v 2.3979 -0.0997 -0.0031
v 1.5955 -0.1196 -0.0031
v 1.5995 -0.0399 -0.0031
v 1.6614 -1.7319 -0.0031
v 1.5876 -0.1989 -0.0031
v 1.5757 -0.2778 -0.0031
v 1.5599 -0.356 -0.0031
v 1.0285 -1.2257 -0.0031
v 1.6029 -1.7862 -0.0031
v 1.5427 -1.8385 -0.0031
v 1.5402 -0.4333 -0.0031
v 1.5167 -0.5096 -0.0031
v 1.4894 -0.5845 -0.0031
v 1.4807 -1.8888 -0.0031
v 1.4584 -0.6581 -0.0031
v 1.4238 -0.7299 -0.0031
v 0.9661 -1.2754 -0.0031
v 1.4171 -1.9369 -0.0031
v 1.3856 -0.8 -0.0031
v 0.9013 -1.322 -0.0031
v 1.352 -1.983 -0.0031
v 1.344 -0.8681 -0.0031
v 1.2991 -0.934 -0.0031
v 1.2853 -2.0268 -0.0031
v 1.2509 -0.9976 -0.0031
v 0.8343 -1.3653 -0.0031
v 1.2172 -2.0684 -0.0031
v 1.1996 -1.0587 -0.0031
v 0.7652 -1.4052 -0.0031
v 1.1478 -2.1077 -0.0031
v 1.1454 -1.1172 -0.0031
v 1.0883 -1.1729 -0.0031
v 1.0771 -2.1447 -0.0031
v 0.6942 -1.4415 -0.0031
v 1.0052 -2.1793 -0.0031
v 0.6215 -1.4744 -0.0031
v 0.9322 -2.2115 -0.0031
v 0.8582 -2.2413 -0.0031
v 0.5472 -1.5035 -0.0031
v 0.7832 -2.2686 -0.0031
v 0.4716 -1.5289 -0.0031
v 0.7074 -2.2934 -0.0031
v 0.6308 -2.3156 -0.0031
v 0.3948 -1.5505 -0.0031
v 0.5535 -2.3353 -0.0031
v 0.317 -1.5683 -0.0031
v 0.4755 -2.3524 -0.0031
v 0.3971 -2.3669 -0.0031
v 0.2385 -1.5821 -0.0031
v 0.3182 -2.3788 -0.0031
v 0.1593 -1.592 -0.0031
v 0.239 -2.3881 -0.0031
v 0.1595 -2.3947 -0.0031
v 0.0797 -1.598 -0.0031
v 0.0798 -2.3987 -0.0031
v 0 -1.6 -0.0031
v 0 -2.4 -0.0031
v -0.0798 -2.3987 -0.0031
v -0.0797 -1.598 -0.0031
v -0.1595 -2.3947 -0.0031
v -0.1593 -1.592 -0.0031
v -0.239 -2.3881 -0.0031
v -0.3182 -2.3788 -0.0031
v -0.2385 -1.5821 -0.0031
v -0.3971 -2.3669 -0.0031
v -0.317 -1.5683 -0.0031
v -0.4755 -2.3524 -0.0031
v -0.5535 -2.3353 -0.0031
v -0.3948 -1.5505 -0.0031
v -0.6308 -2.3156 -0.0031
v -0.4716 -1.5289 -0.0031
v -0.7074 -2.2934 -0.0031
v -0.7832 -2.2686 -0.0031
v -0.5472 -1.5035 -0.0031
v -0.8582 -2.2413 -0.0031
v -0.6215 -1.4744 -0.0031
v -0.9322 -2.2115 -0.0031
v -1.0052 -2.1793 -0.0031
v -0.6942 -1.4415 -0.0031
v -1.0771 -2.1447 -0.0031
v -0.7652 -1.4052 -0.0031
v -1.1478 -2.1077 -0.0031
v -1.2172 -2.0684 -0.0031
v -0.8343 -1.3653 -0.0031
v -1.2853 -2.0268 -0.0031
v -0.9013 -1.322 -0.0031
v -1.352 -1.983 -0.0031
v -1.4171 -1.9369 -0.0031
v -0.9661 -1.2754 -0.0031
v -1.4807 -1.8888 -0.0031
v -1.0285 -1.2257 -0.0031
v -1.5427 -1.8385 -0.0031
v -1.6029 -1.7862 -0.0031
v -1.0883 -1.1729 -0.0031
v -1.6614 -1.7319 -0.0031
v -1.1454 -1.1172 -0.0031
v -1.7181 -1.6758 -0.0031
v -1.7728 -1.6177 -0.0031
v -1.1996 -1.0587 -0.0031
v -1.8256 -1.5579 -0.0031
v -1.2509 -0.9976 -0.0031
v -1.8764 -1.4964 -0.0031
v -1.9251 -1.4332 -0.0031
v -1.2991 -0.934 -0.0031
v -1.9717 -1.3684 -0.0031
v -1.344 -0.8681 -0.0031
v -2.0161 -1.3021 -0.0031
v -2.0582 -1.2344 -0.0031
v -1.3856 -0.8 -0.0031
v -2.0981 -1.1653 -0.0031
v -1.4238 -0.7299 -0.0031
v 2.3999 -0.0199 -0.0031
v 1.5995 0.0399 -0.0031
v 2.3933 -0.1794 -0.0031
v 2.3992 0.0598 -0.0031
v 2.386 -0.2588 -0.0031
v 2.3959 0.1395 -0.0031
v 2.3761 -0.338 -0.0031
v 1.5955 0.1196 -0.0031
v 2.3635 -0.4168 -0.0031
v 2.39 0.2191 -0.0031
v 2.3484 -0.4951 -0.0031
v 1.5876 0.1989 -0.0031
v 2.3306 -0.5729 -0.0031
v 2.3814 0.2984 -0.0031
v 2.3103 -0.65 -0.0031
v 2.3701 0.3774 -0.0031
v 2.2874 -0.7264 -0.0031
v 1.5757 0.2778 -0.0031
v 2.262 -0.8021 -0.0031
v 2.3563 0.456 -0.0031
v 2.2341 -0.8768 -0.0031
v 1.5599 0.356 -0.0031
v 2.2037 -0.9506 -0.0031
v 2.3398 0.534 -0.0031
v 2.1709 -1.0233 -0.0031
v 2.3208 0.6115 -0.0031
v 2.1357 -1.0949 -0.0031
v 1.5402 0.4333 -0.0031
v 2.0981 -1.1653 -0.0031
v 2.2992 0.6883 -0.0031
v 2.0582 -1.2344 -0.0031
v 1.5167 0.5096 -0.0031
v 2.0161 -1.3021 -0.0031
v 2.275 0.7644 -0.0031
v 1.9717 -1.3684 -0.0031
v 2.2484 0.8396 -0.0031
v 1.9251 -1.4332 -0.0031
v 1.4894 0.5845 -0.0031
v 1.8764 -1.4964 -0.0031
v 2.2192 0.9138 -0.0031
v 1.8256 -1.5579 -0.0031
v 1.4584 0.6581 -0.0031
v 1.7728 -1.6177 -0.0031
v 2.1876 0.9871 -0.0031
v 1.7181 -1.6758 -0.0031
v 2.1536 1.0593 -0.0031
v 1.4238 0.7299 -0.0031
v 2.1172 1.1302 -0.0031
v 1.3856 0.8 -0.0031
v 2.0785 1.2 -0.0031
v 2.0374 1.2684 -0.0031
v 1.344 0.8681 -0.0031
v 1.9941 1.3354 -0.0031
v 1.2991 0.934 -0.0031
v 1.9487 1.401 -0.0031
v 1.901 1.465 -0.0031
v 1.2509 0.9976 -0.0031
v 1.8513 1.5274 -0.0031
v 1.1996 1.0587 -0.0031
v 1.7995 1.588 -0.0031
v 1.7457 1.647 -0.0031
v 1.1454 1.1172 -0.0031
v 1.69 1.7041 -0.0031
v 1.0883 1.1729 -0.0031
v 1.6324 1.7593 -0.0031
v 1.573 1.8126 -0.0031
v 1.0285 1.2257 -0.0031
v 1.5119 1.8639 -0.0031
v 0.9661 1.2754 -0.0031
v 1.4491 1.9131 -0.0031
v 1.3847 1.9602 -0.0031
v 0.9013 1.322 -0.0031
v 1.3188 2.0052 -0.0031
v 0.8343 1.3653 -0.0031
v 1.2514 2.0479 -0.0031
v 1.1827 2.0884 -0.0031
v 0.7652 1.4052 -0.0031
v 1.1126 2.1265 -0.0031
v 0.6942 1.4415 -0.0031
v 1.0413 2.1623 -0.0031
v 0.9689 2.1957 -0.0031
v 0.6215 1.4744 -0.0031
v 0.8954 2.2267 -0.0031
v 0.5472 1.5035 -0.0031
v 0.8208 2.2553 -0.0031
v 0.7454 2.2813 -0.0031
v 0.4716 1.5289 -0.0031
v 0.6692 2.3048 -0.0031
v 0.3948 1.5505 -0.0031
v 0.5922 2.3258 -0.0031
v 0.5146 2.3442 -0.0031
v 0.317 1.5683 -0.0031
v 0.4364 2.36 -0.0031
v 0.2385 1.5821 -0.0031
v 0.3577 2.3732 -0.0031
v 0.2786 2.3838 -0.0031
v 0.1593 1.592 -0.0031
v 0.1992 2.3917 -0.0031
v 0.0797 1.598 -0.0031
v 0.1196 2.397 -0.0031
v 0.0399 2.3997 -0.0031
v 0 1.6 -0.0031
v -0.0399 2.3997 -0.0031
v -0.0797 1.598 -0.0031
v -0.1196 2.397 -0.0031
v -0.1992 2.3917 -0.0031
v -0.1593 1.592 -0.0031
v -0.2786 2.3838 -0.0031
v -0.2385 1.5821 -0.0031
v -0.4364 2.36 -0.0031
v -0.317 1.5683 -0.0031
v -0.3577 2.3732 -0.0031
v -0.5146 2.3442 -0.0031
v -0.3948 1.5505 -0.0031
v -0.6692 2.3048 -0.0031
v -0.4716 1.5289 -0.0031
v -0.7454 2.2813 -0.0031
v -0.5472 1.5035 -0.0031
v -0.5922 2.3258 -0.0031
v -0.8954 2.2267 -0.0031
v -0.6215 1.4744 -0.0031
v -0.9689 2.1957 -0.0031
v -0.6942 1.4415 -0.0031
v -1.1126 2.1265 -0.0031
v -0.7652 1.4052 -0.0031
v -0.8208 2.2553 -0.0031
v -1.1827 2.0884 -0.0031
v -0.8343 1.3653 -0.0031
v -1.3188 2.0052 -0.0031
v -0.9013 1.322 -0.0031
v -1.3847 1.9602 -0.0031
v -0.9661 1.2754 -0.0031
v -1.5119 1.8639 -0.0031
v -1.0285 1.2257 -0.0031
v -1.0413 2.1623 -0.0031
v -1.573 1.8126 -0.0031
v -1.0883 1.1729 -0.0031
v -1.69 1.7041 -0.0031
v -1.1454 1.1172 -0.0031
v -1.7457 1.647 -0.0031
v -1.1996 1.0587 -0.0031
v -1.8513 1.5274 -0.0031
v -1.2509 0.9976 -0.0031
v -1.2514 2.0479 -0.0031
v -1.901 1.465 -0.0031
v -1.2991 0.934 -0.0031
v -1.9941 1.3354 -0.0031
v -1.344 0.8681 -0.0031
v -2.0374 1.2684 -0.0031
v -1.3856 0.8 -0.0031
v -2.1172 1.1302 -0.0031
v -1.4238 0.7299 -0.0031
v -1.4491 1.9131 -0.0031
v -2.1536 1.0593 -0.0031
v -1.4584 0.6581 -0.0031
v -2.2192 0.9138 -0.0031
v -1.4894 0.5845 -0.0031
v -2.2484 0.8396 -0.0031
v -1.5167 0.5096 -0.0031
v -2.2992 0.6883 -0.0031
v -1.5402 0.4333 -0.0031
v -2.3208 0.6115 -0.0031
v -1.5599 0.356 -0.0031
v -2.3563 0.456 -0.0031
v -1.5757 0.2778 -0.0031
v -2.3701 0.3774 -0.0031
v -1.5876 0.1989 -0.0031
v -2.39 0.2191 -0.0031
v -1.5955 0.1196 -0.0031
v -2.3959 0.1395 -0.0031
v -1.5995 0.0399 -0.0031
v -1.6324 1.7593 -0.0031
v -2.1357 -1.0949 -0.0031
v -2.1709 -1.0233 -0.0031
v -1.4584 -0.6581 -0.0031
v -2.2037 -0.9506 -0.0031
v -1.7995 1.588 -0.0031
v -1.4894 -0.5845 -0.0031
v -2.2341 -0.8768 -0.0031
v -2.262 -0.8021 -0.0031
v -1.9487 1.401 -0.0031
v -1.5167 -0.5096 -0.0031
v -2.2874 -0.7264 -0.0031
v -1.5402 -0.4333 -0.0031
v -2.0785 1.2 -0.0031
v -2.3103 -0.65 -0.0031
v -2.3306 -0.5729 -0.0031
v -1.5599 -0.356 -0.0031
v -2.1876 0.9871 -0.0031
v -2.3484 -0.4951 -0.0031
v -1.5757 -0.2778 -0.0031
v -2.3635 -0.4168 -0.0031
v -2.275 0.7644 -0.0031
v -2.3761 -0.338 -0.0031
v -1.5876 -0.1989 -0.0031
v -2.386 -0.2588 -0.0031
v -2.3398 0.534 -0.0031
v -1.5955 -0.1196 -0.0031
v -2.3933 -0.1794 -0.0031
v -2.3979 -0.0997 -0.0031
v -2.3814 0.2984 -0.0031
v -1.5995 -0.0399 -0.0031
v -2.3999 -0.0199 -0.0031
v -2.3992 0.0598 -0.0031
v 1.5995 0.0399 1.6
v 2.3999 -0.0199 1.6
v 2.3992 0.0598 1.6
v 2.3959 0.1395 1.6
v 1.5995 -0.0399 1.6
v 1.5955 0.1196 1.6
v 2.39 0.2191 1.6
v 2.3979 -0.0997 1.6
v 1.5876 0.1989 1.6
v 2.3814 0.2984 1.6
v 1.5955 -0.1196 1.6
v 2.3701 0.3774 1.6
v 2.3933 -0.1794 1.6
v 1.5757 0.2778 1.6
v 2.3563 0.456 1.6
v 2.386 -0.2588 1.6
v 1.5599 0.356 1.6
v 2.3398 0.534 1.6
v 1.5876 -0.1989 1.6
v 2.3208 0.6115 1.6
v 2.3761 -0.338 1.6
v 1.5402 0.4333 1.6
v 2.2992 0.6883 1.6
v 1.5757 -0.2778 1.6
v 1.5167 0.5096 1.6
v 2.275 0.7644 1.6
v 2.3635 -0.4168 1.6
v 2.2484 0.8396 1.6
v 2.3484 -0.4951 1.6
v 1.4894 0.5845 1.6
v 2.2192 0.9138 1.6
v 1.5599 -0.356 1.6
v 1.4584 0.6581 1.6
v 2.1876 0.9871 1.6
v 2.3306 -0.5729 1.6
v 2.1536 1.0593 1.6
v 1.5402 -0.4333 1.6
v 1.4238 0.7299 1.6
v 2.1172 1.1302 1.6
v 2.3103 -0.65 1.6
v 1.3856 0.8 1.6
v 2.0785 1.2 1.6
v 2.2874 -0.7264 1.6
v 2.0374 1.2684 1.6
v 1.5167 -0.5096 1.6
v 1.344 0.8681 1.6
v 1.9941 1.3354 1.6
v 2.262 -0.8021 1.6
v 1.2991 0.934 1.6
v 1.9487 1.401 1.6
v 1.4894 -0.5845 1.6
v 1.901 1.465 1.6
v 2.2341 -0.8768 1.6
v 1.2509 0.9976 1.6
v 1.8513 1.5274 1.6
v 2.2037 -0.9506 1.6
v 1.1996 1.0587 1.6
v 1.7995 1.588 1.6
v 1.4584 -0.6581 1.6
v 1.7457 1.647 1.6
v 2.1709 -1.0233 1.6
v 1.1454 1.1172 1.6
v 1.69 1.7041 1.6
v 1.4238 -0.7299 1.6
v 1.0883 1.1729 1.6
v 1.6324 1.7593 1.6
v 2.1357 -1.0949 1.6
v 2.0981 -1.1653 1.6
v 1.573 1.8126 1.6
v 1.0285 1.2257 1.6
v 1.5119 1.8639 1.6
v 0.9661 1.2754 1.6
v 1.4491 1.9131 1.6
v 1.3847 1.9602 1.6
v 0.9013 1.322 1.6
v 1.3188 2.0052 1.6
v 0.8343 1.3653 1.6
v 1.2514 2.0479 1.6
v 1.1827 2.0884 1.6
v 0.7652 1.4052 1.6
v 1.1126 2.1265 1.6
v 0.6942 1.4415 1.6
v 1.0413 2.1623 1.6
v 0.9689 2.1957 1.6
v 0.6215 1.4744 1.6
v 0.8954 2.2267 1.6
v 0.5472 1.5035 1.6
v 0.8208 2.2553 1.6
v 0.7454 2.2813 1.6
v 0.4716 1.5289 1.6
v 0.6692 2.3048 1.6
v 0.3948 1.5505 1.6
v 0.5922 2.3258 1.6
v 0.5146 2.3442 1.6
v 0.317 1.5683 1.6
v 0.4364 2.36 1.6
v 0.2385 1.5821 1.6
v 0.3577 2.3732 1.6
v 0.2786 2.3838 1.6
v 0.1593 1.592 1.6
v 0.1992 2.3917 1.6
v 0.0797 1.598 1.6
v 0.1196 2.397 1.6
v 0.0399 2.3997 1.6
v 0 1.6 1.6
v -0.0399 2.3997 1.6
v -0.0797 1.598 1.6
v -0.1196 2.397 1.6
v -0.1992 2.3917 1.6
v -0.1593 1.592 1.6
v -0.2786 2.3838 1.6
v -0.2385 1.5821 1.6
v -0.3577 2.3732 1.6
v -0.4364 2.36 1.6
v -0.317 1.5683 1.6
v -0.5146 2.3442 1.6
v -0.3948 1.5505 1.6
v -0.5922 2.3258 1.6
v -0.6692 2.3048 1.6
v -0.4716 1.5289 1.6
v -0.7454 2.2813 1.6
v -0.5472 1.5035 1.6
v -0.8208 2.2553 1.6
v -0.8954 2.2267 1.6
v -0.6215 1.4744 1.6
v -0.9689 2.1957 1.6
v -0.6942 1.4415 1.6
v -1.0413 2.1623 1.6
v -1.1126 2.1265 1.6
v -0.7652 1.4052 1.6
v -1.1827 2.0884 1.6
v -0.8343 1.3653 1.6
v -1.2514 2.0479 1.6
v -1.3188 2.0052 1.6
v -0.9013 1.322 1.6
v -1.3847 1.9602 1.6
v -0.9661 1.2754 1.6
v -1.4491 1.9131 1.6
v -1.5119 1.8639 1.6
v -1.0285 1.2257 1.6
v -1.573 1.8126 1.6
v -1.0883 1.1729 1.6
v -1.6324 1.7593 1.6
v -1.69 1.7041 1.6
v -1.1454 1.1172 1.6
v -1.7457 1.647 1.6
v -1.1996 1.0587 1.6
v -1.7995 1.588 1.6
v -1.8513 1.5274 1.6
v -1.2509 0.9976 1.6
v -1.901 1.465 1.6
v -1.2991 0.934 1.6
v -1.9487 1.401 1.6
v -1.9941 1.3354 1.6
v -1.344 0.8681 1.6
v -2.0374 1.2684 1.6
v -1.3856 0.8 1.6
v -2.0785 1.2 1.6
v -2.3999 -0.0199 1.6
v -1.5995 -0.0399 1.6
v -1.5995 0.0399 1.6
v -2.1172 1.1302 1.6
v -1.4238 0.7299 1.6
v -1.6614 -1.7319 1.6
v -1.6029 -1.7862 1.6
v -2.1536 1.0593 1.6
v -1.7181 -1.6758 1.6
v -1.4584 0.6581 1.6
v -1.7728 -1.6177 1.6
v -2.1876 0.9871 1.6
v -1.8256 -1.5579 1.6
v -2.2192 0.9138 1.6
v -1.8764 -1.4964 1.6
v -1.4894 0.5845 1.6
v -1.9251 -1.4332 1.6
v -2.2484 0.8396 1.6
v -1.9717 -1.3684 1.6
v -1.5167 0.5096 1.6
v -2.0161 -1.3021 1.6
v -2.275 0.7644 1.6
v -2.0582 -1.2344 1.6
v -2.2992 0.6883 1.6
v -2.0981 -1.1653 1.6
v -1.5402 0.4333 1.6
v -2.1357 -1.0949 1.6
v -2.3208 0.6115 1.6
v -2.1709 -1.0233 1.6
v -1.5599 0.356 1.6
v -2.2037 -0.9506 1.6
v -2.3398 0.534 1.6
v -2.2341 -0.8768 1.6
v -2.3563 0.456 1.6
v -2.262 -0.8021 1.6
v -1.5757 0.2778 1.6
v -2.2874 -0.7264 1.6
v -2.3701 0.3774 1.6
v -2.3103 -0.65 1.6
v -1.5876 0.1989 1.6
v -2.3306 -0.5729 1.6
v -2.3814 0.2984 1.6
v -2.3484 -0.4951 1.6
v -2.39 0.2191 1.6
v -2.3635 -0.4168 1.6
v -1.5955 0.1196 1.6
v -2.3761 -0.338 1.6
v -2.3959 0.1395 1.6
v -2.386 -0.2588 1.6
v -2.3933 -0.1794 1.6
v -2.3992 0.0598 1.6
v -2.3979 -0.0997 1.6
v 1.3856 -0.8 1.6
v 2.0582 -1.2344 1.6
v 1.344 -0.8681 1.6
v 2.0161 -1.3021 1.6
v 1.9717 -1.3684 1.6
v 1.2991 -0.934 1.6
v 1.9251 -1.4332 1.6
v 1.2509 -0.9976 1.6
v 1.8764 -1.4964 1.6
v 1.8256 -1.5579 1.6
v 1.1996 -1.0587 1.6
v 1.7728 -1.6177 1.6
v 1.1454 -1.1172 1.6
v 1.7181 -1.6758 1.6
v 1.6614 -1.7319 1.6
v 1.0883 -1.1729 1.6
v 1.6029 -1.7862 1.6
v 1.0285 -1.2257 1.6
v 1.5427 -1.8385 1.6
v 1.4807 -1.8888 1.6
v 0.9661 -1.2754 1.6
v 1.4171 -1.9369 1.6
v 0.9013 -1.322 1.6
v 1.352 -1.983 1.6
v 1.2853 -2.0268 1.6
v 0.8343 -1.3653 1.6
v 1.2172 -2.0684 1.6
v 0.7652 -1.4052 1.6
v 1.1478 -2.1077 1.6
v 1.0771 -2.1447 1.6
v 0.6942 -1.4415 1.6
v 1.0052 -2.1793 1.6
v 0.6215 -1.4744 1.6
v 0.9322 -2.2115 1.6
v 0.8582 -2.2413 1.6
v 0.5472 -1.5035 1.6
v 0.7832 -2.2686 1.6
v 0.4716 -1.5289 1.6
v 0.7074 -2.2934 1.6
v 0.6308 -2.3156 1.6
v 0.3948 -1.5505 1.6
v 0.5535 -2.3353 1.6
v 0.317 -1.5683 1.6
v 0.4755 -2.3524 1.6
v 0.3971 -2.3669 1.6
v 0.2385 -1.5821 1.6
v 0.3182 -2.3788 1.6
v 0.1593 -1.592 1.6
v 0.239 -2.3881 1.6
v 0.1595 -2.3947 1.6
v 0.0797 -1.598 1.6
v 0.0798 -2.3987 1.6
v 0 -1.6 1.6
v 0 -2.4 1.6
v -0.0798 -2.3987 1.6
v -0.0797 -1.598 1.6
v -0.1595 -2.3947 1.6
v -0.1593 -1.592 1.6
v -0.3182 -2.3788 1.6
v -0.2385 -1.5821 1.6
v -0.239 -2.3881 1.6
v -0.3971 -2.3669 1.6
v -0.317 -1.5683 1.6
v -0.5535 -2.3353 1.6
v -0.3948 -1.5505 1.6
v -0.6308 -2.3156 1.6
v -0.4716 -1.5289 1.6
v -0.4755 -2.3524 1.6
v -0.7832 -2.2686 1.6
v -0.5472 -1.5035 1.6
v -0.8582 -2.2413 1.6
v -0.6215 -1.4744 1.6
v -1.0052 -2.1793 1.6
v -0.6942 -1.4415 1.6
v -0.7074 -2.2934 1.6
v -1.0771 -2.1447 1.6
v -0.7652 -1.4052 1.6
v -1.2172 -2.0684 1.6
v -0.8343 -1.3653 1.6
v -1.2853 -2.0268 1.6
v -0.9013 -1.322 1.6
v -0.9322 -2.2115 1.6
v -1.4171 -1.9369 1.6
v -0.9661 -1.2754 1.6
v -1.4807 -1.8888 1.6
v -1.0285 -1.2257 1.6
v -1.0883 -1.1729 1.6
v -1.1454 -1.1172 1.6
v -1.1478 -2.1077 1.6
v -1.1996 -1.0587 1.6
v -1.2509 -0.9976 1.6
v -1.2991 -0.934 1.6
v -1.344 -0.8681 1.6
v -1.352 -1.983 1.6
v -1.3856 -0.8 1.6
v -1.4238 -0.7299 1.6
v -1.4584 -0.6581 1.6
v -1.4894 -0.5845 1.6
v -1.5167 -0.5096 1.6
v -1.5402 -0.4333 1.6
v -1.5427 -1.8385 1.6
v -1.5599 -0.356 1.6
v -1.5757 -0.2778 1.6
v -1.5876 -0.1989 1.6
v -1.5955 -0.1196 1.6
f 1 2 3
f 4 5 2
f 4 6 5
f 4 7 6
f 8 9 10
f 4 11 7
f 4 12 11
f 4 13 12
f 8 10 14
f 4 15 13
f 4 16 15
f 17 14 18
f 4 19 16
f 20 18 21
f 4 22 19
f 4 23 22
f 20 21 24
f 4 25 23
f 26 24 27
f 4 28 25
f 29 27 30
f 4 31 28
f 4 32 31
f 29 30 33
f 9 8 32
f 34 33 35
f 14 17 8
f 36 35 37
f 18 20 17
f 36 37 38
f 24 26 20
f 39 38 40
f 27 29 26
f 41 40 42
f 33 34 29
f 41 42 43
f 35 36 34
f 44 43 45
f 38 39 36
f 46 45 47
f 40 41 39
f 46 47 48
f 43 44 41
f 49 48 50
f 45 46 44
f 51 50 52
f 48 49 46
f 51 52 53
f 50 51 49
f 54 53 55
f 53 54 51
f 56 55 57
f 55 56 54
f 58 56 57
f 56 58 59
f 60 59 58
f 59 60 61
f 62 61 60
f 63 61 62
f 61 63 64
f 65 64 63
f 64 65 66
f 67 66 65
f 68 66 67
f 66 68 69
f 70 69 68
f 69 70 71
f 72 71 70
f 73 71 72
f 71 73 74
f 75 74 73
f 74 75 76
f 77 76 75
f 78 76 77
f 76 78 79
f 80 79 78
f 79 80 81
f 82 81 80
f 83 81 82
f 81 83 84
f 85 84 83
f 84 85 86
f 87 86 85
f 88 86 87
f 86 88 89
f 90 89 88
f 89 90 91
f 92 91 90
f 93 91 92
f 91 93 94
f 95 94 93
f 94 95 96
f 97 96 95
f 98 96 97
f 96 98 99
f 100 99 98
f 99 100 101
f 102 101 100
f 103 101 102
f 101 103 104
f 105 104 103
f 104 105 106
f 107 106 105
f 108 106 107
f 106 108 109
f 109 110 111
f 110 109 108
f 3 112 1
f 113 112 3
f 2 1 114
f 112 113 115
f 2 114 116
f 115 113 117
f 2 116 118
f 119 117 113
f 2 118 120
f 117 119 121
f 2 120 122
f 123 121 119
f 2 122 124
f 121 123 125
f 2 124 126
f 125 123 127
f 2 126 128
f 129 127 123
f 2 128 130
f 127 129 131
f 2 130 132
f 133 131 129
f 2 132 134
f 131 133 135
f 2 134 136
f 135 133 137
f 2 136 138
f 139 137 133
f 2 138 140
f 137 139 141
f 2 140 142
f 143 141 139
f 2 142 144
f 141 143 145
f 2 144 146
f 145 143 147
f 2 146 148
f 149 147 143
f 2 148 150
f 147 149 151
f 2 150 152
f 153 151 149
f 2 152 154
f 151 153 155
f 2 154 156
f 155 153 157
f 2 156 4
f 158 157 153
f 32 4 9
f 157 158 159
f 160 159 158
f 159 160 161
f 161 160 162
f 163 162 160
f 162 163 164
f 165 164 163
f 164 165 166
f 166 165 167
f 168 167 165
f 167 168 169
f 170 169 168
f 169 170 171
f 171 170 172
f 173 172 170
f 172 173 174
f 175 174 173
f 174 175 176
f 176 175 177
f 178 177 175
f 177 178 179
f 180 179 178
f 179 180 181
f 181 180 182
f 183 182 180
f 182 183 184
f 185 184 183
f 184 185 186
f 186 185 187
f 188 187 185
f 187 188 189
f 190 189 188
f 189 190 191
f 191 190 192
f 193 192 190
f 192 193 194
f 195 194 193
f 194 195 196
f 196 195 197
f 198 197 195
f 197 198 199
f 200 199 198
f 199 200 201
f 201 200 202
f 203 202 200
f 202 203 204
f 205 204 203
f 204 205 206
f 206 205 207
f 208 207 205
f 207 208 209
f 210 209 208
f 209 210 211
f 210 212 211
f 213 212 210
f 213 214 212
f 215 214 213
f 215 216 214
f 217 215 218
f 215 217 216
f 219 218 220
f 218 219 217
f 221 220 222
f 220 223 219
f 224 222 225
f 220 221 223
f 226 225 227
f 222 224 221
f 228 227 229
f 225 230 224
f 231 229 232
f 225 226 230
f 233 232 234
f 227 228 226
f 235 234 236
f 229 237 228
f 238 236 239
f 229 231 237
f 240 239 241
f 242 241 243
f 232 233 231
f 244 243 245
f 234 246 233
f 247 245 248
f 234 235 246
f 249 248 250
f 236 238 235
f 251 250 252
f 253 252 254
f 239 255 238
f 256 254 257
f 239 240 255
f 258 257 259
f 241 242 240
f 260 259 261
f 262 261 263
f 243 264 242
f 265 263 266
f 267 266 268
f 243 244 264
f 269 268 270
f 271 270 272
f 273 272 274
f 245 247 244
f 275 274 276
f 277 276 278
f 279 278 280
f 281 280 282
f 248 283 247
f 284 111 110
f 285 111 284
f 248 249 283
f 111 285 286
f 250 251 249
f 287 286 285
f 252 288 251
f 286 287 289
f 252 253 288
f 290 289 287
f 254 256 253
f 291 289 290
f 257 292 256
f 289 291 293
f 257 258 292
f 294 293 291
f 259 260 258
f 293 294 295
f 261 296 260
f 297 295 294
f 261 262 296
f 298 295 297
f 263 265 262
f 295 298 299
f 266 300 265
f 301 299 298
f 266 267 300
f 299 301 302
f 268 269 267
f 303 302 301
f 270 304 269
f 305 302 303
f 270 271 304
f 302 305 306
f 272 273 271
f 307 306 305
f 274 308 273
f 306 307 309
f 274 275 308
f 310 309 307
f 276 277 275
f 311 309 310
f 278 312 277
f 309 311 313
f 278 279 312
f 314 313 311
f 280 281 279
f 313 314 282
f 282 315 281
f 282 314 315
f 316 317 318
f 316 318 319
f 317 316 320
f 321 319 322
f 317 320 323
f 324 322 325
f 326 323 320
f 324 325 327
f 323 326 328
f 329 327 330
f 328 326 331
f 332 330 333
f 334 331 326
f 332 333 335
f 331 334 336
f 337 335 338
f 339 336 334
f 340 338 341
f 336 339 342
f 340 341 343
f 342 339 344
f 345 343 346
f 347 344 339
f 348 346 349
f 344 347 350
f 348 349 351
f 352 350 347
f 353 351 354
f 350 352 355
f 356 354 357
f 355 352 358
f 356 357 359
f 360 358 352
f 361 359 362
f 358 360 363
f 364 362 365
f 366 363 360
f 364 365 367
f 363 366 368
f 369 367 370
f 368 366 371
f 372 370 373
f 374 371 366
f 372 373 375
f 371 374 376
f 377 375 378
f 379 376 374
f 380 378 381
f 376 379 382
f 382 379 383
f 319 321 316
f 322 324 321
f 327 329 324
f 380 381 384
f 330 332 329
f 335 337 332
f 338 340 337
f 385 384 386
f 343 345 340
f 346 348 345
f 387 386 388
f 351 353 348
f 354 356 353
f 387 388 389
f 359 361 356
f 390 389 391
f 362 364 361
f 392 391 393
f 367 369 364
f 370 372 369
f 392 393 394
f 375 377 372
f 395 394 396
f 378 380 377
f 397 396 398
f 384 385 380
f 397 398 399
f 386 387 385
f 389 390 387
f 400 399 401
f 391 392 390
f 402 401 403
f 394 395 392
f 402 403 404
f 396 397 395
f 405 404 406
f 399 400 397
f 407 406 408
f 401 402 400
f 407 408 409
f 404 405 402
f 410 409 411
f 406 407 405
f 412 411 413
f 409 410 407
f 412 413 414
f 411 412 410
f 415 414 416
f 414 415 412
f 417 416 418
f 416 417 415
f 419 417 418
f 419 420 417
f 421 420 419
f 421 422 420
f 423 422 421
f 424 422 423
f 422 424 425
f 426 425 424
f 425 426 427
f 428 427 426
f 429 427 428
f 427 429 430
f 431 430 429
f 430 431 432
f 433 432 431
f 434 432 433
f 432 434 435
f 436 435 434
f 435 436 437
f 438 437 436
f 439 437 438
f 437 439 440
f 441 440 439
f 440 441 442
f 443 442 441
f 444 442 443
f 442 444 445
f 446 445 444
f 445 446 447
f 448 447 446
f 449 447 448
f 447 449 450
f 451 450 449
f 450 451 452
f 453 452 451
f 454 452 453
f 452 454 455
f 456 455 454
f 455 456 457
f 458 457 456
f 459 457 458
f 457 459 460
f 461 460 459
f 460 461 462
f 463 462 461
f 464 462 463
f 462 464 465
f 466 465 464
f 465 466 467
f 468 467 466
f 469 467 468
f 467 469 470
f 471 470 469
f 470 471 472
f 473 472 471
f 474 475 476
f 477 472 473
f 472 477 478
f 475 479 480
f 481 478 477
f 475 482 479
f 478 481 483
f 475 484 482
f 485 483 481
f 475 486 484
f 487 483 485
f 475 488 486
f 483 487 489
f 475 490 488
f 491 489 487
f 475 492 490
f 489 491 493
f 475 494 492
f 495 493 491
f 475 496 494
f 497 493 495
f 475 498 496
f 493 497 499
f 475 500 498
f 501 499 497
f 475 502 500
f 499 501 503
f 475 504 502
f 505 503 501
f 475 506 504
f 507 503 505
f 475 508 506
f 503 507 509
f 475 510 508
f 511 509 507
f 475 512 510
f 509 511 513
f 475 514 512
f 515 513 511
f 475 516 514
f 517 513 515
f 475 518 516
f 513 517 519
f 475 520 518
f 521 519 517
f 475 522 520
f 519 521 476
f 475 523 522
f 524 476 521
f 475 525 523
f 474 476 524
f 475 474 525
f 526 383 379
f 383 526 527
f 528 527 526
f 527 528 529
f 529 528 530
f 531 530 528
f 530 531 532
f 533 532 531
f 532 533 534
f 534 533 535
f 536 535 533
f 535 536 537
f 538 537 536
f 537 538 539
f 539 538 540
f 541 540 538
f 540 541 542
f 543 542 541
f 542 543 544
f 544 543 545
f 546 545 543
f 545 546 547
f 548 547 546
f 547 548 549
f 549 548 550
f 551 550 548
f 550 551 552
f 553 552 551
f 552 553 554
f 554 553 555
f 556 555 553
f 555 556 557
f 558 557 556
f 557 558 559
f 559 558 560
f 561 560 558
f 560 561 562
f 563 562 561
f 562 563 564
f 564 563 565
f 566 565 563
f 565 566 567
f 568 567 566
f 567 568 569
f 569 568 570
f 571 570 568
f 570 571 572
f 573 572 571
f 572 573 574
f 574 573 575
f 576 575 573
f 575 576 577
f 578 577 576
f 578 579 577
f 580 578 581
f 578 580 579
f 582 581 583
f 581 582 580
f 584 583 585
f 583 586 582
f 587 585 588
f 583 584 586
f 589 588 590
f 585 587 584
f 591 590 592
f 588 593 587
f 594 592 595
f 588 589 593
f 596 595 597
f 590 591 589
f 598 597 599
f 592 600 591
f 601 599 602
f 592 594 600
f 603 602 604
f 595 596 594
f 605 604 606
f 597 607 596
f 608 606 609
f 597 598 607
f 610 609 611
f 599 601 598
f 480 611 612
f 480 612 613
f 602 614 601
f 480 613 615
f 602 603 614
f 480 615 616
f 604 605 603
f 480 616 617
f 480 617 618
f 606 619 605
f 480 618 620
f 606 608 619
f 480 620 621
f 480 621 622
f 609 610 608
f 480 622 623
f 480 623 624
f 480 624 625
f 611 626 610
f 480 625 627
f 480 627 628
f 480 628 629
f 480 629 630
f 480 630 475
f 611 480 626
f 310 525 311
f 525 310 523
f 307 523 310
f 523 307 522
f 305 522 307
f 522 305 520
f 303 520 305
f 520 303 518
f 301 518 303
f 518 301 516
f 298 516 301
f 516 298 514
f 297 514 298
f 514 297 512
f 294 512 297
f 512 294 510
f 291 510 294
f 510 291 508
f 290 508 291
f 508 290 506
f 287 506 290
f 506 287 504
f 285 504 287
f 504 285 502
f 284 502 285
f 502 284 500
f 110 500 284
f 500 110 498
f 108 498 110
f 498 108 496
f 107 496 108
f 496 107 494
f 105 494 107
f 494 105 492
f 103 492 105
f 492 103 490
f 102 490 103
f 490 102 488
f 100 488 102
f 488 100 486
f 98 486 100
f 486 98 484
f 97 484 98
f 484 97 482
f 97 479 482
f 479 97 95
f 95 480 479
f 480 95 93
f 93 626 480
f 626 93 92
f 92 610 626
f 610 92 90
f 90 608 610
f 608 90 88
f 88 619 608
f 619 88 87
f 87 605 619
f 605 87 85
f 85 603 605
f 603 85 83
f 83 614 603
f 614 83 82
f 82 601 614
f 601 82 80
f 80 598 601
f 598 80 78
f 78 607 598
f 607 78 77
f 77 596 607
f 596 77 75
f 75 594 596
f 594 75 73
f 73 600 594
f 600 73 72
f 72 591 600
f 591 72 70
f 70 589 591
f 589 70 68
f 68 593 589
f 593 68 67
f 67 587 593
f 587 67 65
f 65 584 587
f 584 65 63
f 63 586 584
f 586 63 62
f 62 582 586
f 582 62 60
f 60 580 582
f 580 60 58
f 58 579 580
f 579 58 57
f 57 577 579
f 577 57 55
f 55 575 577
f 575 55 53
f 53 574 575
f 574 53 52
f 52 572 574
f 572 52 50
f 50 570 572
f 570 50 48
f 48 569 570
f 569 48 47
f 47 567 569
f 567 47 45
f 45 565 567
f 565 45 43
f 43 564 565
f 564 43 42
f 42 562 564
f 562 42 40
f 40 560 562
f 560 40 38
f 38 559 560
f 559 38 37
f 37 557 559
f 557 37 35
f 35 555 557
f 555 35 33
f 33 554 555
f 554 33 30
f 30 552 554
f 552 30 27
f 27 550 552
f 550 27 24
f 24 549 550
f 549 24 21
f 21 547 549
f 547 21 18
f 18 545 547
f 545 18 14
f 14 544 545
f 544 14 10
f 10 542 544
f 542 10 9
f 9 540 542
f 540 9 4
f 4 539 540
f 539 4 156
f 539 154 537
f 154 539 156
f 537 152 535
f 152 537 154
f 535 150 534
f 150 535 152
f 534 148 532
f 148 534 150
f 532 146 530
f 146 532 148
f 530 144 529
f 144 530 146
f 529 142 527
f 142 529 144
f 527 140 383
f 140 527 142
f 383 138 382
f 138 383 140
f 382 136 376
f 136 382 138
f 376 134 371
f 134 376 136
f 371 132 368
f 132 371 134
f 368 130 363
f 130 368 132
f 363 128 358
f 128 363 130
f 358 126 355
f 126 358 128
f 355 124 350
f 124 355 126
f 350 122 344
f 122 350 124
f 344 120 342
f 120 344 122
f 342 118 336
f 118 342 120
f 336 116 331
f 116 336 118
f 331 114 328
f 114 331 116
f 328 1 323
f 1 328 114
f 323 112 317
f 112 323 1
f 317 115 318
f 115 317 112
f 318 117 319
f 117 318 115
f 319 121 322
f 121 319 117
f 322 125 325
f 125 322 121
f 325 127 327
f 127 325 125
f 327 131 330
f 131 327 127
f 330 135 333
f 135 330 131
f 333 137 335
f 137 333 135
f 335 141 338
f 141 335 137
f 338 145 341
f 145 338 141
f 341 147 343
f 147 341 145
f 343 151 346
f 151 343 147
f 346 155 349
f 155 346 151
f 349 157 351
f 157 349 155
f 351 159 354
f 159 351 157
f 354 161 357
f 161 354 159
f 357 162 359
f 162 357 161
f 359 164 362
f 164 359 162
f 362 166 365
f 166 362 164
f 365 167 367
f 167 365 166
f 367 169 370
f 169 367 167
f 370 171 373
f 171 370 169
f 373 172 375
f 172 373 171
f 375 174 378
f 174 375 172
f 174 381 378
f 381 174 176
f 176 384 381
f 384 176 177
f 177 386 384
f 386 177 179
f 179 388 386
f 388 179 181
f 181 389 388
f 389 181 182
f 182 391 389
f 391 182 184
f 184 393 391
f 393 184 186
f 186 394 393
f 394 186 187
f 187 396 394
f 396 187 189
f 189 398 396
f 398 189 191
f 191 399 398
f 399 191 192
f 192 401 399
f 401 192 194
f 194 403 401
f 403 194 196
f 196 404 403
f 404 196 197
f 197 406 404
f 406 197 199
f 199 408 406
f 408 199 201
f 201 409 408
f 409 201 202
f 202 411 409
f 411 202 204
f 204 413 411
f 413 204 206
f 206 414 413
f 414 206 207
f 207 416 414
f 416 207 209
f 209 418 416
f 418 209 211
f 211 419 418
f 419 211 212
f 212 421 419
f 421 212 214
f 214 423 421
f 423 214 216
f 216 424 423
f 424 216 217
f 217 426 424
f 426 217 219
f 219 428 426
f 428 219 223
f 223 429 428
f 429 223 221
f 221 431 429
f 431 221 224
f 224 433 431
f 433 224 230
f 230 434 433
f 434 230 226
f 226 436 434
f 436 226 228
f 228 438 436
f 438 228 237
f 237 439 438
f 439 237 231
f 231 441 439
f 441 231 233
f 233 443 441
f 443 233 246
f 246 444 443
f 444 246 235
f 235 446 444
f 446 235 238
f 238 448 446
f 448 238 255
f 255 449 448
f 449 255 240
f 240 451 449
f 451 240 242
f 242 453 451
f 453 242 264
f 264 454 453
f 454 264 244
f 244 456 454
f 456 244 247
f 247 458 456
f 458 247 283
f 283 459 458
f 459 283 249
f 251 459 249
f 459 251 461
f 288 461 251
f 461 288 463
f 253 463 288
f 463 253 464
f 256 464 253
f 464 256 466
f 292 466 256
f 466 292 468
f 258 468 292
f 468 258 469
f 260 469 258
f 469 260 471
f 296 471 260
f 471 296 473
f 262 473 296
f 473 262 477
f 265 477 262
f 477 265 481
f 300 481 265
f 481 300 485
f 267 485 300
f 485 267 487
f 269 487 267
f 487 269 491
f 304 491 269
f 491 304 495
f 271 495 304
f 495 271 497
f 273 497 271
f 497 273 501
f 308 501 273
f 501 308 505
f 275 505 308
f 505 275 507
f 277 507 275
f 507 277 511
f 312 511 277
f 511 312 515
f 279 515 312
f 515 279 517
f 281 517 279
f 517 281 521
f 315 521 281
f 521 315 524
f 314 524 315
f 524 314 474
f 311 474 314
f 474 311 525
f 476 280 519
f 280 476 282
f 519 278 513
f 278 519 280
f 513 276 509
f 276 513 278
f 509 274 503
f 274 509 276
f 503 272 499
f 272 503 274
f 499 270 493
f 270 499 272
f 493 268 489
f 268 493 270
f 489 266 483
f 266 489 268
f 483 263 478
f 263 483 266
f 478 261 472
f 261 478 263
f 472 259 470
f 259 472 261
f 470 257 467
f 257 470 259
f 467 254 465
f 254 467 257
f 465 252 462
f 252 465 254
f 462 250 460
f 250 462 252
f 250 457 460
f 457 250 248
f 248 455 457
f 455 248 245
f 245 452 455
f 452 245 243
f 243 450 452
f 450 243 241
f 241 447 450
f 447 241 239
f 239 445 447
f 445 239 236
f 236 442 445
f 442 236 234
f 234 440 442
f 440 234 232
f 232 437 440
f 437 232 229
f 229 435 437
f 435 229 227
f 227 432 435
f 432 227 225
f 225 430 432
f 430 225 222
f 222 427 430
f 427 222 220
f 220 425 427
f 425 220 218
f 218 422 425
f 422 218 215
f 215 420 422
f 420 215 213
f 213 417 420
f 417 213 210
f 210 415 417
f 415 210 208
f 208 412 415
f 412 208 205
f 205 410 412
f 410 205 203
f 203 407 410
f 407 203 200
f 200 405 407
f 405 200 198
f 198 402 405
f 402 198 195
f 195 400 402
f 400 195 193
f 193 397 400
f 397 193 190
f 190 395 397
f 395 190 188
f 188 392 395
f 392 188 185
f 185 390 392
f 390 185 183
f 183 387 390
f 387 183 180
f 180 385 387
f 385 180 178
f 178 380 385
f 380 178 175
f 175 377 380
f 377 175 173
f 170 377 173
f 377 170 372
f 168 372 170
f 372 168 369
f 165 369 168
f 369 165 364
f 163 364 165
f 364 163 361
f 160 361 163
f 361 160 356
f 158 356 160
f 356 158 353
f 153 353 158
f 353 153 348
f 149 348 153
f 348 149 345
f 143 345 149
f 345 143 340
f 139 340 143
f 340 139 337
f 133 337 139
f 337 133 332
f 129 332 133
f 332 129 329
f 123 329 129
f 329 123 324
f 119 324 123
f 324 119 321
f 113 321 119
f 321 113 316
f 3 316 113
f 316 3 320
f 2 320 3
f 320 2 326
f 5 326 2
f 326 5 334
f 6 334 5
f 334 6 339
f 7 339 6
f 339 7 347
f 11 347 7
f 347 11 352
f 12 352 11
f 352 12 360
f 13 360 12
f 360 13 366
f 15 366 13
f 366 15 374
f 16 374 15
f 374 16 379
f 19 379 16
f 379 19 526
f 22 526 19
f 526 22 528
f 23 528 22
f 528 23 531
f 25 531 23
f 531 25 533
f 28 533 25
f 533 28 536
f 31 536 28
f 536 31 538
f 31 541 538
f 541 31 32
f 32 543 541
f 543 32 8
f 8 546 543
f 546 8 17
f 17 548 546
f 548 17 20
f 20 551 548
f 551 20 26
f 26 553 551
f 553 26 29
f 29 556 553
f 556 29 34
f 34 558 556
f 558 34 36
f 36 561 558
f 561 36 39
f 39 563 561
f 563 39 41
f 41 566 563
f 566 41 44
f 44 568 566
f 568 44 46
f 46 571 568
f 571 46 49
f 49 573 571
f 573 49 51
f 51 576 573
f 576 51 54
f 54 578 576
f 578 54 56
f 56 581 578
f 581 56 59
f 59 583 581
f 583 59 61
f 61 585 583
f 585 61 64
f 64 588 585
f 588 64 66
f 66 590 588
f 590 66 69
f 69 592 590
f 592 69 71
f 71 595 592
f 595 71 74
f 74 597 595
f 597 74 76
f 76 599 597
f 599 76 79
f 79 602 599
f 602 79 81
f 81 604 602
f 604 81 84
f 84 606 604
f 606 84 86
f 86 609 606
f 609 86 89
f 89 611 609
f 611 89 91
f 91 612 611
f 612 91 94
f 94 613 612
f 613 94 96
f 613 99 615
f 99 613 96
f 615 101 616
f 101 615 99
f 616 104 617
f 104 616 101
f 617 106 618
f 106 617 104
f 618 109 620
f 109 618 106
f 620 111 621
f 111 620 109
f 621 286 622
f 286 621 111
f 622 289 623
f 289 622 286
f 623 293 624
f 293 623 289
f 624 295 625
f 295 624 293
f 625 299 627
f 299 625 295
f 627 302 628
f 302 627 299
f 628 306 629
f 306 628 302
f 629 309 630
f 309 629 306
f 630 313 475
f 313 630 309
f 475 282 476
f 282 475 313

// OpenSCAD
use <../lib.scad>
use <../p/1-4cylo.scad>
use <../p/1-4disc.scad>
use <../p/1-4edge.scad>
use <../p/1-4ndis.scad>
use <../p/4-4ring4.scad>
use <../p/box3-7a.scad>
use <../p/box4-7a.scad>
use <../p/rect2a.scad>
use <s/3861s01.scad>
use <../p/stud4o.scad>
$fa=1; $fs=0.2;
function ldraw_lib__3861c(realsolid=false) = [
// 0 Door  1 x  4 x  5 with 4 Panes and Reinforced Hinge
// 0 Name: 3861c.dat
// 0 Author: Alex Taylor [anathema]
// 0 !LDRAW_ORG Part UPDATE 2022-01
// 0 !LICENSE Licensed under CC BY 2.0 and CC BY 4.0 : see CAreadme.txt
// 
// 0 BFC CERTIFY CCW
  [0,"BFC","CERTIFY"],
  [0,"BFC","CCW"],
// 
// 0 !HISTORY 1999-03-26 [PTadmin] Official Update 1999-02
// 0 !HISTORY 2000-05-07 [PTadmin] Official Update 2000-01
// 0 !HISTORY 2000-08-01 {Axel Poque} fixes to resolve L3P error messages
// 0 !HISTORY 2000-08-01 {Manfred Moolhuysen} fixes to resolve L3P error messages
// 0 !HISTORY 2000-09-30 [PTadmin] Official Update 2000-02
// 0 !HISTORY 2007-06-30 [PTadmin] Header formatted for Contributor Agreement
// 0 !HISTORY 2008-07-01 [PTadmin] Official Update 2008-01
// 0 !HISTORY 2009-10-26 [Steffen] BFCed
// 0 !HISTORY 2010-07-05 [PTadmin] Official Update 2010-02
// 0 !HISTORY 2019-08-01 [anathema] Use common geometry subpart
// 0 !HISTORY 2020-04-19 [PTadmin] Renamed from 3861
// 0 !HISTORY 2022-01-14 [PTadmin] Official Update 2022-01
// 
// 
// 1 16 0 0 0 1 0 0 0 1 0 0 0 1 s\3861s01.dat
  [1,16,0,0,0,1,0,0,0,1,0,0,0,1, ldraw_lib__s__3861s01(realsolid)],
// 1 16 0 116 0 1 0 0 0 -1 0 0 0 1 stud4o.dat
  [1,16,0,116,0,1,0,0,0,-1,0,0,0,1, ldraw_lib__stud4o(realsolid)],
// 1 16 0 120 0 2 0 0 0 -1 0 0 0 -2 4-4ring4.dat
  [1,16,0,120,0,2,0,0,0,-1,0,0,0,-2, ldraw_lib__4_4ring4(realsolid)],
// 1 16 0 120 0 10 0 0 0 -1 0 0 0 -10 1-4ndis.dat
  [1,16,0,120,0,10,0,0,0,-1,0,0,0,-10, ldraw_lib__1_4ndis(realsolid)],
// 1 16 0 120 0 -10 0 0 0 -1 0 0 0 10 1-4ndis.dat
  [1,16,0,120,0,-10,0,0,0,-1,0,0,0,10, ldraw_lib__1_4ndis(realsolid)],
// 1 16 5 116 -5 0 0 5 0 -4 0 -5 0 0 box3-7a.dat
  [1,16,5,116,-5,0,0,5,0,-4,0,-5,0,0, ldraw_lib__box3_7a(realsolid)],
// 2 24 0 120 10 -10 120 10
  [2,24,0,120,10,-10,120,10],
// 2 24 -10 114 10 -6 114 10
  [2,24,-10,114,10,-6,114,10],
// 1 16 0 112 0 -6 0 0 0 1 0 0 0 -6 1-4edge.dat
  [1,16,0,112,0,-6,0,0,0,1,0,0,0,-6, ldraw_lib__1_4edge(realsolid)],
// 2 24 0 112 -6 0 112 -10
  [2,24,0,112,-6,0,112,-10],
// 2 24 -6 112 10 -6 114 10
  [2,24,-6,112,10,-6,114,10],
// 1 16 0 112 0 -6 0 0 0 1 0 0 0 -6 1-4disc.dat
  [1,16,0,112,0,-6,0,0,0,1,0,0,0,-6, ldraw_lib__1_4disc(realsolid)],
// 1 16 0 112 0 10 0 0 0 1 0 0 0 10 1-4disc.dat
  [1,16,0,112,0,10,0,0,0,1,0,0,0,10, ldraw_lib__1_4disc(realsolid)],
// 1 16 -3 112 5 -3 0 0 0 1 0 0 0 5 rect2a.dat
  [1,16,-3,112,5,-3,0,0,0,1,0,0,0,5, ldraw_lib__rect2a(realsolid)],
// 4 16 -10 120 10 -10 114 10 -6 114 10 0 120 10
  [4,16,-10,120,10,-10,114,10,-6,114,10,0,120,10],
// 4 16 -6 114 10 -6 112 10 0 112 10 0 120 10
  [4,16,-6,114,10,-6,112,10,0,112,10,0,120,10],
// 1 16 0 112 0 10 0 0 0 8 0 0 0 10 1-4cylo.dat
  [1,16,0,112,0,10,0,0,0,8,0,0,0,10, ldraw_lib__1_4cylo(realsolid)],
// 1 16 -10 117 5 0 1 0 3 0 0 0 0 5 rect2a.dat
  [1,16,-10,117,5,0,1,0,3,0,0,0,0,5, ldraw_lib__rect2a(realsolid)],
// 1 16 0 2 -5 0 10 0 2 0 0 0 0 -5 box4-7a.dat
  [1,16,0,2,-5,0,10,0,2,0,0,0,0,-5, ldraw_lib__box4_7a(realsolid)],
];
module ldraw_lib__3861c(step=0, col=false, unit=2/5, alt=false, line=0.2, solid=!$preview)
    makepoly(ldraw_lib__3861c(solid), step=step, col=col, unit=unit, alt=alt, line=line, solid=solid);
ldraw_lib__3861c(line=0.2);
